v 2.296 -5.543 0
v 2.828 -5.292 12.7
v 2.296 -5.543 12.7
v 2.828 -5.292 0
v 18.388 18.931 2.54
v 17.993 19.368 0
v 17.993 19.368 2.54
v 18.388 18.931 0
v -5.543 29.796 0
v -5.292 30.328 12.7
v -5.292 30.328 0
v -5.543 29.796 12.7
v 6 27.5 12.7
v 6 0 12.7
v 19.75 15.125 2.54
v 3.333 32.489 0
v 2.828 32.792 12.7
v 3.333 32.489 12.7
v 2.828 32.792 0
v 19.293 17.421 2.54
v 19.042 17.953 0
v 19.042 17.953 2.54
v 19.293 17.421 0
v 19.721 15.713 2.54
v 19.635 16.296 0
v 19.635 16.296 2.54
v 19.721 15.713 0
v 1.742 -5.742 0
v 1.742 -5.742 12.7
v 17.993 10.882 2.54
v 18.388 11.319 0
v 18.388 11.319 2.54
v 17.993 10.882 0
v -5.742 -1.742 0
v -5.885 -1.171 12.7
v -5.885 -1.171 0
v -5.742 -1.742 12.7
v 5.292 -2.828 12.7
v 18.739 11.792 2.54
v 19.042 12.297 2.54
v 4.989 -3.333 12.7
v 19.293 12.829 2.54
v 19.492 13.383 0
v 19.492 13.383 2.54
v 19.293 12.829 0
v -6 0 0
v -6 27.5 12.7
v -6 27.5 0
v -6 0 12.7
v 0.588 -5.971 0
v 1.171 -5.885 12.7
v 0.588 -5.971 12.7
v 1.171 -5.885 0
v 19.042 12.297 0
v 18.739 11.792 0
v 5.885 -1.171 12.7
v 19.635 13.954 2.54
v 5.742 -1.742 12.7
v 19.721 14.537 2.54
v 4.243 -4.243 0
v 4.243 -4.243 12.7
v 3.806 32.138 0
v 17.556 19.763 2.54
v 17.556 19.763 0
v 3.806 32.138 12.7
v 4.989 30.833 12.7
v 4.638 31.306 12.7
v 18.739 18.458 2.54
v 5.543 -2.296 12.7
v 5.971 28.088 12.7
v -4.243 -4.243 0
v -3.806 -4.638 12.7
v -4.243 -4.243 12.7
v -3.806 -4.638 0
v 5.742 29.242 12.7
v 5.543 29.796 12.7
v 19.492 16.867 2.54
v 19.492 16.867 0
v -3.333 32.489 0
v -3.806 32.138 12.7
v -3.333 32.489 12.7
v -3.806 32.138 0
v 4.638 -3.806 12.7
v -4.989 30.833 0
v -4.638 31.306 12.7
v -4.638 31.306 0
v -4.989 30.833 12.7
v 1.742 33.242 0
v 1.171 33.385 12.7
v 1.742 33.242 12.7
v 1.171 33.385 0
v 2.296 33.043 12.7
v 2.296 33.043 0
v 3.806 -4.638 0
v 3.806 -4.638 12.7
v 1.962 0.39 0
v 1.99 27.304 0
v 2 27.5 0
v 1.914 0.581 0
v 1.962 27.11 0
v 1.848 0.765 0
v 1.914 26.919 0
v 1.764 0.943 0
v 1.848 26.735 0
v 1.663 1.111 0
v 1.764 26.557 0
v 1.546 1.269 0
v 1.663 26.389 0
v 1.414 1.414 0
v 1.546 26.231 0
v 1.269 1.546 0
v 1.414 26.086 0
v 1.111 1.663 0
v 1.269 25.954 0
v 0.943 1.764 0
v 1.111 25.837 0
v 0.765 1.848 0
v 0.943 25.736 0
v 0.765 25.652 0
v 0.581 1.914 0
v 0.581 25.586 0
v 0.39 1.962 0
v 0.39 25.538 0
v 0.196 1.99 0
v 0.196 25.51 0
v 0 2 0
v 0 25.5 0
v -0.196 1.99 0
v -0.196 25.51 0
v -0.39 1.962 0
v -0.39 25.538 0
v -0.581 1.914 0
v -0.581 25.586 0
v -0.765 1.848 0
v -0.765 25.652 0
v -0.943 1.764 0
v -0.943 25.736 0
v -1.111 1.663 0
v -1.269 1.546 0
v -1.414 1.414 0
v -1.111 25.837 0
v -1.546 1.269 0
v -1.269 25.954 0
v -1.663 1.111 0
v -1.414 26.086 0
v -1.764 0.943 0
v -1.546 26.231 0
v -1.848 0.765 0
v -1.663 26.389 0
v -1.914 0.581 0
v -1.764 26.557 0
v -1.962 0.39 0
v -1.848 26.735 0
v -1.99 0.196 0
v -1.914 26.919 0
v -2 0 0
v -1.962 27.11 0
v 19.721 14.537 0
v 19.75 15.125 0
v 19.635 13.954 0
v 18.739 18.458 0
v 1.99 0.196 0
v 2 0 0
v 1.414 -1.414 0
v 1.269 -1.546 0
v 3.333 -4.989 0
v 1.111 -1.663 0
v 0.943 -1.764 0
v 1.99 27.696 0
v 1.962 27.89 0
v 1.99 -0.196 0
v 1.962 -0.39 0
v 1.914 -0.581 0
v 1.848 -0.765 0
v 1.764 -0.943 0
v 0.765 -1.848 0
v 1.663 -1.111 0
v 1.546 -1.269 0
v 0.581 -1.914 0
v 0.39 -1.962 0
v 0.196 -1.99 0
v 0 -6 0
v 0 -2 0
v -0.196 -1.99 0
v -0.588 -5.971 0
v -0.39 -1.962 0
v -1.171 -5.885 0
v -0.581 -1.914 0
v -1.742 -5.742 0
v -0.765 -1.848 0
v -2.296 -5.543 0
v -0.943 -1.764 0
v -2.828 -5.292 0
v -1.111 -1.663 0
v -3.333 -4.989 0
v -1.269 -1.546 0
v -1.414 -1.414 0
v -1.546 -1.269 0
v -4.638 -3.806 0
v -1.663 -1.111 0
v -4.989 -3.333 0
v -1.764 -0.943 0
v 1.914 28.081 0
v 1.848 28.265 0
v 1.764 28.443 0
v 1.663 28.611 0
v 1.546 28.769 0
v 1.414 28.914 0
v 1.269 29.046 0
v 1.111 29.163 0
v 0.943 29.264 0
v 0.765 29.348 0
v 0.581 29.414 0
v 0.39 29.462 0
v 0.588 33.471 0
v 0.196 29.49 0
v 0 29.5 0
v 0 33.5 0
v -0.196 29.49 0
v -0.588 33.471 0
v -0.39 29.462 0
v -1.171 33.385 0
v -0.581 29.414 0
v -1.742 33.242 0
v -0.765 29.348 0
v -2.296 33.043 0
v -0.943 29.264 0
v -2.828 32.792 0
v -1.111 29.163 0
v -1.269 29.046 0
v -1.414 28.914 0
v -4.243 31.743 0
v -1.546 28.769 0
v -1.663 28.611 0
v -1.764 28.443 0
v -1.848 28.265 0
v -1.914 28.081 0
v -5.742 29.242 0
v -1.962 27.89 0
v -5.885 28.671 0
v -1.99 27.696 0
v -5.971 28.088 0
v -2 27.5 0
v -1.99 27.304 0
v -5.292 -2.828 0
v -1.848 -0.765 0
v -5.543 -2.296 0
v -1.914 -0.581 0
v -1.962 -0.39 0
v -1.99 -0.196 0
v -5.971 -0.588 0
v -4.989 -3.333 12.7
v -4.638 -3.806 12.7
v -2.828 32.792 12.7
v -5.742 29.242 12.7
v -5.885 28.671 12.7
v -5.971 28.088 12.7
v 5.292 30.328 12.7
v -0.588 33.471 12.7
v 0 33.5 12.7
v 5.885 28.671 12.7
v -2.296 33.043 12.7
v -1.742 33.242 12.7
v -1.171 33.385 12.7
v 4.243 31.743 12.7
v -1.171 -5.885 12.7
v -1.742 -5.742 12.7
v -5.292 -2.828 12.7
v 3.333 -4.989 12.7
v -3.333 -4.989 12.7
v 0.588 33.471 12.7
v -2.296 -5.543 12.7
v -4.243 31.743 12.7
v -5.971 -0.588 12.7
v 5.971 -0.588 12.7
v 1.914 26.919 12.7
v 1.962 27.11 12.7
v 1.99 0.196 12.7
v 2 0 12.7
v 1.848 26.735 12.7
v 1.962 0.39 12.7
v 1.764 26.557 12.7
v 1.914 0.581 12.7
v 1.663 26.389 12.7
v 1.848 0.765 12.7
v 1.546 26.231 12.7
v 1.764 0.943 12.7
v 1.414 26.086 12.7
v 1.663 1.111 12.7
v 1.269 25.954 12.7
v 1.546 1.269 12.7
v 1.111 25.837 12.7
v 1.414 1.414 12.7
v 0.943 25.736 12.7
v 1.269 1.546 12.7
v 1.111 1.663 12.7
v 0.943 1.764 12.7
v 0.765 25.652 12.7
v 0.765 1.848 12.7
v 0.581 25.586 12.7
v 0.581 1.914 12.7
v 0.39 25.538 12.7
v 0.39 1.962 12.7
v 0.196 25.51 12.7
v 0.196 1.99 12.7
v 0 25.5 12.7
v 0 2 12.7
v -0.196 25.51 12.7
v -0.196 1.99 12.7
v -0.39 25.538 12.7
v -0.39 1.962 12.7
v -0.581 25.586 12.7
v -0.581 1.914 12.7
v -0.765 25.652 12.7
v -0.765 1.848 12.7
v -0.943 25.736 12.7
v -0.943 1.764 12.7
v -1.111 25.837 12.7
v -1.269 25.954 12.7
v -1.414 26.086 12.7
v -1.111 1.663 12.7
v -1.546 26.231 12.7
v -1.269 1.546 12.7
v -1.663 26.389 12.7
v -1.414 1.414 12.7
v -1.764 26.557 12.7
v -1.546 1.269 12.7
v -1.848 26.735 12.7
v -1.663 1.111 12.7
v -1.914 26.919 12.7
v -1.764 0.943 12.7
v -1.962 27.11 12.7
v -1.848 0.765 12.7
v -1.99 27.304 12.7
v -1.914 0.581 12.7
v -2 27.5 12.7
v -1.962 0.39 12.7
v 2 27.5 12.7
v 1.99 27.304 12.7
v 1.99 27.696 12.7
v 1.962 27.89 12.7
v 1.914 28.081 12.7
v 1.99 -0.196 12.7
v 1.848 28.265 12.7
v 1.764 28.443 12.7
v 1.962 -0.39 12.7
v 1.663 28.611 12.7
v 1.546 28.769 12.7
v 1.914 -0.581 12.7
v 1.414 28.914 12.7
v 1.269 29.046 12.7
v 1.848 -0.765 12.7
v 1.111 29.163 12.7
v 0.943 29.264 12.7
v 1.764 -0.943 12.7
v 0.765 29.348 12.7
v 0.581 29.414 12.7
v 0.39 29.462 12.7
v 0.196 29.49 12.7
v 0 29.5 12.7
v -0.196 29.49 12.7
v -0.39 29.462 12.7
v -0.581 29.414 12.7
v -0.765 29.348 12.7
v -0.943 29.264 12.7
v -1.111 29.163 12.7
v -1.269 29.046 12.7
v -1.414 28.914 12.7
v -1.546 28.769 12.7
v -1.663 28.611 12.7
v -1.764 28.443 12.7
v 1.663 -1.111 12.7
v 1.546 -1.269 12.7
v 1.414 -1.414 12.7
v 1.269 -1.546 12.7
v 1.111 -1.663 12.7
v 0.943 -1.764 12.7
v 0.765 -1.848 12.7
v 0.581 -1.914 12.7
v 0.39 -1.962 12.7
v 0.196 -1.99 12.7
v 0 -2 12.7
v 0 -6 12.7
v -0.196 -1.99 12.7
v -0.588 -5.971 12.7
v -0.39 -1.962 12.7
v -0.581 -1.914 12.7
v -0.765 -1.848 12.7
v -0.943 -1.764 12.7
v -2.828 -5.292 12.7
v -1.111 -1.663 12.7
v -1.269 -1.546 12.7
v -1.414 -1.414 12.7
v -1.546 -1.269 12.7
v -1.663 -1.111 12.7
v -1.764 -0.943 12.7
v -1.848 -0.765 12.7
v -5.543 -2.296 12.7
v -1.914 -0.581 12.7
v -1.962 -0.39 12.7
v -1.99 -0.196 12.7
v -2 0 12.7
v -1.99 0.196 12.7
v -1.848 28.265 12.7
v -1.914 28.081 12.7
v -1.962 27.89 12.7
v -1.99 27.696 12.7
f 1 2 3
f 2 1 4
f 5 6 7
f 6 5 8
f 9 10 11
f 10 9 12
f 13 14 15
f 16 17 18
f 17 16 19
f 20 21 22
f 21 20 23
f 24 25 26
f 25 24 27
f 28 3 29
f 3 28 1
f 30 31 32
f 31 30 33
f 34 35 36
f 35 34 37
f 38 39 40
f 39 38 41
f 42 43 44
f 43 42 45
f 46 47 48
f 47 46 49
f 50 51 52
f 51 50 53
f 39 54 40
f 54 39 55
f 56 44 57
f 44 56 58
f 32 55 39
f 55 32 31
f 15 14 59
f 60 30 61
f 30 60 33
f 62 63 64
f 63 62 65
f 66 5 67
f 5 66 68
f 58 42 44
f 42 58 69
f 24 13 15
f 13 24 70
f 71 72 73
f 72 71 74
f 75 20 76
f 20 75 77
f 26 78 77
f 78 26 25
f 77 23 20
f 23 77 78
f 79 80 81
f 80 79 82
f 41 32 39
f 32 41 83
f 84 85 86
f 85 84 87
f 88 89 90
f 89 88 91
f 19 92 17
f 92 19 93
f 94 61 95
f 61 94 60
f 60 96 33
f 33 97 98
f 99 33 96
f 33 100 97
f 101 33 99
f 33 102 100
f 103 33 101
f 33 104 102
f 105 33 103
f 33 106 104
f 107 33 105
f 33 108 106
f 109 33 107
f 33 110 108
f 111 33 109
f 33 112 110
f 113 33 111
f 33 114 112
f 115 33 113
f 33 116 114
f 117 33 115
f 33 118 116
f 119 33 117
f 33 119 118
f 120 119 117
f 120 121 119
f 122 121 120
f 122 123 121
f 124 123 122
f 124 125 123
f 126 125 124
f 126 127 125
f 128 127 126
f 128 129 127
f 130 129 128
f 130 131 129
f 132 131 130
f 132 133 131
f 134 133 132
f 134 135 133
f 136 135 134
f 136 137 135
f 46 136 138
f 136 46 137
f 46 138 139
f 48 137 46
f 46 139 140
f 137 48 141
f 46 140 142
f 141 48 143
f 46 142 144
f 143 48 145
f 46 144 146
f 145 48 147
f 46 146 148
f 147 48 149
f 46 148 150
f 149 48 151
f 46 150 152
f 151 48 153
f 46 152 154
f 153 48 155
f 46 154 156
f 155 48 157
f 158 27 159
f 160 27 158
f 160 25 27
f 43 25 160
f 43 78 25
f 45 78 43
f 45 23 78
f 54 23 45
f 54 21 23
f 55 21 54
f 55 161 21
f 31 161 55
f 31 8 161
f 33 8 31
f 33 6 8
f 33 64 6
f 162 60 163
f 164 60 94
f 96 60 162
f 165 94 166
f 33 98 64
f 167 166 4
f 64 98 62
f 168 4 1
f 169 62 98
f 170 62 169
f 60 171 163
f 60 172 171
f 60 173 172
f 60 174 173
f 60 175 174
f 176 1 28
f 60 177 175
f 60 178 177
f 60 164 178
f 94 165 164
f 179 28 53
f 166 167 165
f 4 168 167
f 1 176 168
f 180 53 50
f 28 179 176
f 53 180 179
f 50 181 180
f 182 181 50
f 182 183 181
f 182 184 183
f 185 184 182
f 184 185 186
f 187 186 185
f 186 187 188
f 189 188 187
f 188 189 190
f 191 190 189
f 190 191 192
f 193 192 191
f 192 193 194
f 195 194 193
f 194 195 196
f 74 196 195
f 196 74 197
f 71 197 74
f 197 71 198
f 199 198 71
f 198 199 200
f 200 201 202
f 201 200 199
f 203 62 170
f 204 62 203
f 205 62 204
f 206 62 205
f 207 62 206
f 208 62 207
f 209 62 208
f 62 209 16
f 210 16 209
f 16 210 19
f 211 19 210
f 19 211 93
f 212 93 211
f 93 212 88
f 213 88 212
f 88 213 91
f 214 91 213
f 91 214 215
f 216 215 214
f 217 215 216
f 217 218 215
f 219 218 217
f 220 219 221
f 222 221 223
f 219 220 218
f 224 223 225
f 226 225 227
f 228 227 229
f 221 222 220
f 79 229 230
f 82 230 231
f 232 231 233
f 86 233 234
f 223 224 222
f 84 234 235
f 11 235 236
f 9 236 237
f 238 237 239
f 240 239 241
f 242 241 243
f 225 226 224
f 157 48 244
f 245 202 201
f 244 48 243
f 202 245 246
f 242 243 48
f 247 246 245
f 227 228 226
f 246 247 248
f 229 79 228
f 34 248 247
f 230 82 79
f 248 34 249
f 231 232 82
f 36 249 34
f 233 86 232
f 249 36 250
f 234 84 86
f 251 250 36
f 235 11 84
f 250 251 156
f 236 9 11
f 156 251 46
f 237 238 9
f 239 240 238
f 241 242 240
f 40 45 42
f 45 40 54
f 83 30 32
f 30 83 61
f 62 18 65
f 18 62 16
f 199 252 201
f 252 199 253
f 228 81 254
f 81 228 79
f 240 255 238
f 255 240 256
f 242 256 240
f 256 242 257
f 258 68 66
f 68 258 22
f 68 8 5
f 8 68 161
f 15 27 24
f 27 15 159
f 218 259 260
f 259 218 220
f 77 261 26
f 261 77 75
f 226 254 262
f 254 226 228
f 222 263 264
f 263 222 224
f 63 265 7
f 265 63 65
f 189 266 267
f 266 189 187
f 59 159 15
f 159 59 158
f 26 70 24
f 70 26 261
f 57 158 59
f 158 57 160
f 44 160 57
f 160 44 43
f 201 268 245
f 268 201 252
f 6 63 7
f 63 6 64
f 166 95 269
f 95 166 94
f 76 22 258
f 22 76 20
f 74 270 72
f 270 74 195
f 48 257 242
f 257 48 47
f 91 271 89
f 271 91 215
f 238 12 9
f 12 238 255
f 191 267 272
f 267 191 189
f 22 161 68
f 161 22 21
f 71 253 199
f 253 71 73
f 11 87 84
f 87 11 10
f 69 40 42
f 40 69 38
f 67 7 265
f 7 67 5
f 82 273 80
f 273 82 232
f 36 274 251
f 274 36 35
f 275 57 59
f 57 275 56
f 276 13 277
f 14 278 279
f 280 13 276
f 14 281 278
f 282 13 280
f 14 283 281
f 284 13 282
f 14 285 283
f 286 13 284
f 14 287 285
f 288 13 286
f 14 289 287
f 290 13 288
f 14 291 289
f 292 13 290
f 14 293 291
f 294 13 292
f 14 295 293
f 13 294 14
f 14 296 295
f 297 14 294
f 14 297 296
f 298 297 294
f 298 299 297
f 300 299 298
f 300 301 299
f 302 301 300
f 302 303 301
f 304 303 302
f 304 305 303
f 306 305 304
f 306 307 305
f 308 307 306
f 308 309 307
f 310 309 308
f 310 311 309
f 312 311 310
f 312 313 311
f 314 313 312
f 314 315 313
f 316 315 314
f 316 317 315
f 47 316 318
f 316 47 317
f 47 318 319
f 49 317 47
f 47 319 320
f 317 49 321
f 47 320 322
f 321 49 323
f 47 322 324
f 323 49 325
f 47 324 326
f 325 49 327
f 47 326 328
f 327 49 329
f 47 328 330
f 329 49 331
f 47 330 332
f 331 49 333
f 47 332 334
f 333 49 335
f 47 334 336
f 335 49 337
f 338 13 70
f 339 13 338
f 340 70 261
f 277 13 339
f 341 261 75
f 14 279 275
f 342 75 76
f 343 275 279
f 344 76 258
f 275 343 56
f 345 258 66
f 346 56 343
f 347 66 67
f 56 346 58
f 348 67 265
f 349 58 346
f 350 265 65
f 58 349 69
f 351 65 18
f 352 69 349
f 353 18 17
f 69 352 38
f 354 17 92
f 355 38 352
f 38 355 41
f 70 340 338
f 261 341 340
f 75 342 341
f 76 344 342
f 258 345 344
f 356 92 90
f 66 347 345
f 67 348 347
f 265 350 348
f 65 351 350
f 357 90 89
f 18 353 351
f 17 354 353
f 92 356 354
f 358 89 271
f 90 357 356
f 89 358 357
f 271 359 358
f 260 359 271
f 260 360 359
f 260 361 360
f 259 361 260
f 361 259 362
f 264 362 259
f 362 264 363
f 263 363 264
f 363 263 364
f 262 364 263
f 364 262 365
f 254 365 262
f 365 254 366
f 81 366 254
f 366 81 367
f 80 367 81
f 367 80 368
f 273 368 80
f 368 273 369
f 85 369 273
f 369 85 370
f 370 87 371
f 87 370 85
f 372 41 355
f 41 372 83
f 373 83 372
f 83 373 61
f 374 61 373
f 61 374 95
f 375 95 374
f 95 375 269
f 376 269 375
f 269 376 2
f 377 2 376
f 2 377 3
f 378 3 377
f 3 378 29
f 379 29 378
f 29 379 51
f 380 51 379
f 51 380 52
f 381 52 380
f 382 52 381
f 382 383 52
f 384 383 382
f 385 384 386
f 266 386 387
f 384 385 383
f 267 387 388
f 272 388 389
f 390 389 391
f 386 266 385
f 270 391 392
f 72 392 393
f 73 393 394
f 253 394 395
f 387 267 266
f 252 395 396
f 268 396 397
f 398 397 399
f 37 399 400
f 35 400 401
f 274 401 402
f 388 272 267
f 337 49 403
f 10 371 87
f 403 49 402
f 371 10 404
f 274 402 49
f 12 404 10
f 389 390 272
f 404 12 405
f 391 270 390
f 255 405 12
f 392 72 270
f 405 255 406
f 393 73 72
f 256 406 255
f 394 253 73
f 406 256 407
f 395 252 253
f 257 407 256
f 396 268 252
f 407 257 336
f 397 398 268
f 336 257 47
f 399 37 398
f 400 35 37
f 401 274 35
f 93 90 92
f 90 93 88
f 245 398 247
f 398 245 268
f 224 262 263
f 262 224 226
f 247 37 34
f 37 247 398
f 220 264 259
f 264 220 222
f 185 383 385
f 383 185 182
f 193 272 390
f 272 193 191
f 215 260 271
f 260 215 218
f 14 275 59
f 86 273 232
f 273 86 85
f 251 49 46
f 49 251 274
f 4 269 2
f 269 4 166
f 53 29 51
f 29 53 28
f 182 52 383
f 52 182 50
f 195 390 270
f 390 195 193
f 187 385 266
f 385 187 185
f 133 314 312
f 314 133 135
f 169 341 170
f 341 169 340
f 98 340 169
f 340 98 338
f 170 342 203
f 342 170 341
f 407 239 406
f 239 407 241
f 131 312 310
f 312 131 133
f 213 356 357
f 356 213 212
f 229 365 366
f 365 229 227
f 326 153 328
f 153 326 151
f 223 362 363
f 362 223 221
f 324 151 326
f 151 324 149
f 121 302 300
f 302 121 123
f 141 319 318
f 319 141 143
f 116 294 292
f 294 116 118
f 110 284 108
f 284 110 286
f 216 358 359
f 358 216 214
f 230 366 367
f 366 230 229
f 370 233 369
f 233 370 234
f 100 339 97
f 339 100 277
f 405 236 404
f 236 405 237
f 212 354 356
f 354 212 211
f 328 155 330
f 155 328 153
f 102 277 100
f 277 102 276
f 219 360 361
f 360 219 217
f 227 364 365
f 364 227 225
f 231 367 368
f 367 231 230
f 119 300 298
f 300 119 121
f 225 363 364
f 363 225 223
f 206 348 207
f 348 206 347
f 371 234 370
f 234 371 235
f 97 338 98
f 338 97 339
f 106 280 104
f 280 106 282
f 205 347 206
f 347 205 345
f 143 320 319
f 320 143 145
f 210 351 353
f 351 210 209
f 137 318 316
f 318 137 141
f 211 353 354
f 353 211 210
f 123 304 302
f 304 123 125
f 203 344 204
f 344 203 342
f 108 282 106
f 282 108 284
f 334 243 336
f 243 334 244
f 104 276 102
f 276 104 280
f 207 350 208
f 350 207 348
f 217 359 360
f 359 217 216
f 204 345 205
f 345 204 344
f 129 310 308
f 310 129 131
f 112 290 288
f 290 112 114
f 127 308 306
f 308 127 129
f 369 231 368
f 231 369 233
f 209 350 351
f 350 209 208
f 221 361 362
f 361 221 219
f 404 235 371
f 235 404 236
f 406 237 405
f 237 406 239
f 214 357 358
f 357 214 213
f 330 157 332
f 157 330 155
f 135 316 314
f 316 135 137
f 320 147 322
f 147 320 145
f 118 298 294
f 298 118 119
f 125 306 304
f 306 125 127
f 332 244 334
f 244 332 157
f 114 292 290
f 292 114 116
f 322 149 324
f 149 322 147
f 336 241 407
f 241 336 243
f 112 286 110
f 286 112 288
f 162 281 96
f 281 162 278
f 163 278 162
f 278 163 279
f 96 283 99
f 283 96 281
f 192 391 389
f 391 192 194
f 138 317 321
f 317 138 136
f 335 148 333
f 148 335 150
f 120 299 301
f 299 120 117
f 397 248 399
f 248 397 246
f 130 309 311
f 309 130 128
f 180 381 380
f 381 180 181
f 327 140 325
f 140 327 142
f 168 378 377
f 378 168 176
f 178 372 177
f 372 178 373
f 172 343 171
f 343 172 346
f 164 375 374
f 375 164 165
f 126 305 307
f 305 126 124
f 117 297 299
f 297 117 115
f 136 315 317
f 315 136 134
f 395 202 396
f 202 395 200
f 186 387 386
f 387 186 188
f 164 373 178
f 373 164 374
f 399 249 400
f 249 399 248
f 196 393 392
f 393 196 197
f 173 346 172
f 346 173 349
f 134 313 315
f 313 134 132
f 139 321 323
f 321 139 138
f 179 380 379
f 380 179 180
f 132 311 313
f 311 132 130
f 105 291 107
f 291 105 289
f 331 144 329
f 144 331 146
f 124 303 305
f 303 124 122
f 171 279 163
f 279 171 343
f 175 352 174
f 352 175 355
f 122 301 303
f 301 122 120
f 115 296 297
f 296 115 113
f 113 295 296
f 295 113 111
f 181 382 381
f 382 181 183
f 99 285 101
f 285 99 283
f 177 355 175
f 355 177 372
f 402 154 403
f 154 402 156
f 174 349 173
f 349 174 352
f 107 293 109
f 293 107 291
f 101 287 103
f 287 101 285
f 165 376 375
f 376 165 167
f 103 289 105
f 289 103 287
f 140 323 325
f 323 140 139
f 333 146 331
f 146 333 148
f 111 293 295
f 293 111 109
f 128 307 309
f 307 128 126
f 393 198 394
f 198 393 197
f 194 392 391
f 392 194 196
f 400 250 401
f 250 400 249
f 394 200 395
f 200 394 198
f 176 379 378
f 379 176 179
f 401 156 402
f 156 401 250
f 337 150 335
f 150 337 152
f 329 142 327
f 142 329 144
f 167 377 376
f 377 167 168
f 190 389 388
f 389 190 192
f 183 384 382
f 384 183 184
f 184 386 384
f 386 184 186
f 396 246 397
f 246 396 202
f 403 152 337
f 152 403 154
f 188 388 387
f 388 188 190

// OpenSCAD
INCH_TO_MM = 25.4;
SCREW_HOLE_DIAM = 4;
HOLE_OFFSET = 27.5;

difference() {
    hull() {
        cylinder(d=12, h=0.5 * INCH_TO_MM, $fn=64);
        translate([0, HOLE_OFFSET, 0]) cylinder(d=12, h=0.5 * INCH_TO_MM, $fn=64);
        translate([0.5 * HOLE_OFFSET, 0.55 * HOLE_OFFSET, 0]) cylinder(d=12, h=0.1 * INCH_TO_MM, $fn=64);
    }
    translate([0, HOLE_OFFSET, 0]) cylinder(d=SCREW_HOLE_DIAM, h=0.5 * INCH_TO_MM, $fn=64);
    cylinder(d=SCREW_HOLE_DIAM, h=0.5 * INCH_TO_MM, $fn=64);
}
    
